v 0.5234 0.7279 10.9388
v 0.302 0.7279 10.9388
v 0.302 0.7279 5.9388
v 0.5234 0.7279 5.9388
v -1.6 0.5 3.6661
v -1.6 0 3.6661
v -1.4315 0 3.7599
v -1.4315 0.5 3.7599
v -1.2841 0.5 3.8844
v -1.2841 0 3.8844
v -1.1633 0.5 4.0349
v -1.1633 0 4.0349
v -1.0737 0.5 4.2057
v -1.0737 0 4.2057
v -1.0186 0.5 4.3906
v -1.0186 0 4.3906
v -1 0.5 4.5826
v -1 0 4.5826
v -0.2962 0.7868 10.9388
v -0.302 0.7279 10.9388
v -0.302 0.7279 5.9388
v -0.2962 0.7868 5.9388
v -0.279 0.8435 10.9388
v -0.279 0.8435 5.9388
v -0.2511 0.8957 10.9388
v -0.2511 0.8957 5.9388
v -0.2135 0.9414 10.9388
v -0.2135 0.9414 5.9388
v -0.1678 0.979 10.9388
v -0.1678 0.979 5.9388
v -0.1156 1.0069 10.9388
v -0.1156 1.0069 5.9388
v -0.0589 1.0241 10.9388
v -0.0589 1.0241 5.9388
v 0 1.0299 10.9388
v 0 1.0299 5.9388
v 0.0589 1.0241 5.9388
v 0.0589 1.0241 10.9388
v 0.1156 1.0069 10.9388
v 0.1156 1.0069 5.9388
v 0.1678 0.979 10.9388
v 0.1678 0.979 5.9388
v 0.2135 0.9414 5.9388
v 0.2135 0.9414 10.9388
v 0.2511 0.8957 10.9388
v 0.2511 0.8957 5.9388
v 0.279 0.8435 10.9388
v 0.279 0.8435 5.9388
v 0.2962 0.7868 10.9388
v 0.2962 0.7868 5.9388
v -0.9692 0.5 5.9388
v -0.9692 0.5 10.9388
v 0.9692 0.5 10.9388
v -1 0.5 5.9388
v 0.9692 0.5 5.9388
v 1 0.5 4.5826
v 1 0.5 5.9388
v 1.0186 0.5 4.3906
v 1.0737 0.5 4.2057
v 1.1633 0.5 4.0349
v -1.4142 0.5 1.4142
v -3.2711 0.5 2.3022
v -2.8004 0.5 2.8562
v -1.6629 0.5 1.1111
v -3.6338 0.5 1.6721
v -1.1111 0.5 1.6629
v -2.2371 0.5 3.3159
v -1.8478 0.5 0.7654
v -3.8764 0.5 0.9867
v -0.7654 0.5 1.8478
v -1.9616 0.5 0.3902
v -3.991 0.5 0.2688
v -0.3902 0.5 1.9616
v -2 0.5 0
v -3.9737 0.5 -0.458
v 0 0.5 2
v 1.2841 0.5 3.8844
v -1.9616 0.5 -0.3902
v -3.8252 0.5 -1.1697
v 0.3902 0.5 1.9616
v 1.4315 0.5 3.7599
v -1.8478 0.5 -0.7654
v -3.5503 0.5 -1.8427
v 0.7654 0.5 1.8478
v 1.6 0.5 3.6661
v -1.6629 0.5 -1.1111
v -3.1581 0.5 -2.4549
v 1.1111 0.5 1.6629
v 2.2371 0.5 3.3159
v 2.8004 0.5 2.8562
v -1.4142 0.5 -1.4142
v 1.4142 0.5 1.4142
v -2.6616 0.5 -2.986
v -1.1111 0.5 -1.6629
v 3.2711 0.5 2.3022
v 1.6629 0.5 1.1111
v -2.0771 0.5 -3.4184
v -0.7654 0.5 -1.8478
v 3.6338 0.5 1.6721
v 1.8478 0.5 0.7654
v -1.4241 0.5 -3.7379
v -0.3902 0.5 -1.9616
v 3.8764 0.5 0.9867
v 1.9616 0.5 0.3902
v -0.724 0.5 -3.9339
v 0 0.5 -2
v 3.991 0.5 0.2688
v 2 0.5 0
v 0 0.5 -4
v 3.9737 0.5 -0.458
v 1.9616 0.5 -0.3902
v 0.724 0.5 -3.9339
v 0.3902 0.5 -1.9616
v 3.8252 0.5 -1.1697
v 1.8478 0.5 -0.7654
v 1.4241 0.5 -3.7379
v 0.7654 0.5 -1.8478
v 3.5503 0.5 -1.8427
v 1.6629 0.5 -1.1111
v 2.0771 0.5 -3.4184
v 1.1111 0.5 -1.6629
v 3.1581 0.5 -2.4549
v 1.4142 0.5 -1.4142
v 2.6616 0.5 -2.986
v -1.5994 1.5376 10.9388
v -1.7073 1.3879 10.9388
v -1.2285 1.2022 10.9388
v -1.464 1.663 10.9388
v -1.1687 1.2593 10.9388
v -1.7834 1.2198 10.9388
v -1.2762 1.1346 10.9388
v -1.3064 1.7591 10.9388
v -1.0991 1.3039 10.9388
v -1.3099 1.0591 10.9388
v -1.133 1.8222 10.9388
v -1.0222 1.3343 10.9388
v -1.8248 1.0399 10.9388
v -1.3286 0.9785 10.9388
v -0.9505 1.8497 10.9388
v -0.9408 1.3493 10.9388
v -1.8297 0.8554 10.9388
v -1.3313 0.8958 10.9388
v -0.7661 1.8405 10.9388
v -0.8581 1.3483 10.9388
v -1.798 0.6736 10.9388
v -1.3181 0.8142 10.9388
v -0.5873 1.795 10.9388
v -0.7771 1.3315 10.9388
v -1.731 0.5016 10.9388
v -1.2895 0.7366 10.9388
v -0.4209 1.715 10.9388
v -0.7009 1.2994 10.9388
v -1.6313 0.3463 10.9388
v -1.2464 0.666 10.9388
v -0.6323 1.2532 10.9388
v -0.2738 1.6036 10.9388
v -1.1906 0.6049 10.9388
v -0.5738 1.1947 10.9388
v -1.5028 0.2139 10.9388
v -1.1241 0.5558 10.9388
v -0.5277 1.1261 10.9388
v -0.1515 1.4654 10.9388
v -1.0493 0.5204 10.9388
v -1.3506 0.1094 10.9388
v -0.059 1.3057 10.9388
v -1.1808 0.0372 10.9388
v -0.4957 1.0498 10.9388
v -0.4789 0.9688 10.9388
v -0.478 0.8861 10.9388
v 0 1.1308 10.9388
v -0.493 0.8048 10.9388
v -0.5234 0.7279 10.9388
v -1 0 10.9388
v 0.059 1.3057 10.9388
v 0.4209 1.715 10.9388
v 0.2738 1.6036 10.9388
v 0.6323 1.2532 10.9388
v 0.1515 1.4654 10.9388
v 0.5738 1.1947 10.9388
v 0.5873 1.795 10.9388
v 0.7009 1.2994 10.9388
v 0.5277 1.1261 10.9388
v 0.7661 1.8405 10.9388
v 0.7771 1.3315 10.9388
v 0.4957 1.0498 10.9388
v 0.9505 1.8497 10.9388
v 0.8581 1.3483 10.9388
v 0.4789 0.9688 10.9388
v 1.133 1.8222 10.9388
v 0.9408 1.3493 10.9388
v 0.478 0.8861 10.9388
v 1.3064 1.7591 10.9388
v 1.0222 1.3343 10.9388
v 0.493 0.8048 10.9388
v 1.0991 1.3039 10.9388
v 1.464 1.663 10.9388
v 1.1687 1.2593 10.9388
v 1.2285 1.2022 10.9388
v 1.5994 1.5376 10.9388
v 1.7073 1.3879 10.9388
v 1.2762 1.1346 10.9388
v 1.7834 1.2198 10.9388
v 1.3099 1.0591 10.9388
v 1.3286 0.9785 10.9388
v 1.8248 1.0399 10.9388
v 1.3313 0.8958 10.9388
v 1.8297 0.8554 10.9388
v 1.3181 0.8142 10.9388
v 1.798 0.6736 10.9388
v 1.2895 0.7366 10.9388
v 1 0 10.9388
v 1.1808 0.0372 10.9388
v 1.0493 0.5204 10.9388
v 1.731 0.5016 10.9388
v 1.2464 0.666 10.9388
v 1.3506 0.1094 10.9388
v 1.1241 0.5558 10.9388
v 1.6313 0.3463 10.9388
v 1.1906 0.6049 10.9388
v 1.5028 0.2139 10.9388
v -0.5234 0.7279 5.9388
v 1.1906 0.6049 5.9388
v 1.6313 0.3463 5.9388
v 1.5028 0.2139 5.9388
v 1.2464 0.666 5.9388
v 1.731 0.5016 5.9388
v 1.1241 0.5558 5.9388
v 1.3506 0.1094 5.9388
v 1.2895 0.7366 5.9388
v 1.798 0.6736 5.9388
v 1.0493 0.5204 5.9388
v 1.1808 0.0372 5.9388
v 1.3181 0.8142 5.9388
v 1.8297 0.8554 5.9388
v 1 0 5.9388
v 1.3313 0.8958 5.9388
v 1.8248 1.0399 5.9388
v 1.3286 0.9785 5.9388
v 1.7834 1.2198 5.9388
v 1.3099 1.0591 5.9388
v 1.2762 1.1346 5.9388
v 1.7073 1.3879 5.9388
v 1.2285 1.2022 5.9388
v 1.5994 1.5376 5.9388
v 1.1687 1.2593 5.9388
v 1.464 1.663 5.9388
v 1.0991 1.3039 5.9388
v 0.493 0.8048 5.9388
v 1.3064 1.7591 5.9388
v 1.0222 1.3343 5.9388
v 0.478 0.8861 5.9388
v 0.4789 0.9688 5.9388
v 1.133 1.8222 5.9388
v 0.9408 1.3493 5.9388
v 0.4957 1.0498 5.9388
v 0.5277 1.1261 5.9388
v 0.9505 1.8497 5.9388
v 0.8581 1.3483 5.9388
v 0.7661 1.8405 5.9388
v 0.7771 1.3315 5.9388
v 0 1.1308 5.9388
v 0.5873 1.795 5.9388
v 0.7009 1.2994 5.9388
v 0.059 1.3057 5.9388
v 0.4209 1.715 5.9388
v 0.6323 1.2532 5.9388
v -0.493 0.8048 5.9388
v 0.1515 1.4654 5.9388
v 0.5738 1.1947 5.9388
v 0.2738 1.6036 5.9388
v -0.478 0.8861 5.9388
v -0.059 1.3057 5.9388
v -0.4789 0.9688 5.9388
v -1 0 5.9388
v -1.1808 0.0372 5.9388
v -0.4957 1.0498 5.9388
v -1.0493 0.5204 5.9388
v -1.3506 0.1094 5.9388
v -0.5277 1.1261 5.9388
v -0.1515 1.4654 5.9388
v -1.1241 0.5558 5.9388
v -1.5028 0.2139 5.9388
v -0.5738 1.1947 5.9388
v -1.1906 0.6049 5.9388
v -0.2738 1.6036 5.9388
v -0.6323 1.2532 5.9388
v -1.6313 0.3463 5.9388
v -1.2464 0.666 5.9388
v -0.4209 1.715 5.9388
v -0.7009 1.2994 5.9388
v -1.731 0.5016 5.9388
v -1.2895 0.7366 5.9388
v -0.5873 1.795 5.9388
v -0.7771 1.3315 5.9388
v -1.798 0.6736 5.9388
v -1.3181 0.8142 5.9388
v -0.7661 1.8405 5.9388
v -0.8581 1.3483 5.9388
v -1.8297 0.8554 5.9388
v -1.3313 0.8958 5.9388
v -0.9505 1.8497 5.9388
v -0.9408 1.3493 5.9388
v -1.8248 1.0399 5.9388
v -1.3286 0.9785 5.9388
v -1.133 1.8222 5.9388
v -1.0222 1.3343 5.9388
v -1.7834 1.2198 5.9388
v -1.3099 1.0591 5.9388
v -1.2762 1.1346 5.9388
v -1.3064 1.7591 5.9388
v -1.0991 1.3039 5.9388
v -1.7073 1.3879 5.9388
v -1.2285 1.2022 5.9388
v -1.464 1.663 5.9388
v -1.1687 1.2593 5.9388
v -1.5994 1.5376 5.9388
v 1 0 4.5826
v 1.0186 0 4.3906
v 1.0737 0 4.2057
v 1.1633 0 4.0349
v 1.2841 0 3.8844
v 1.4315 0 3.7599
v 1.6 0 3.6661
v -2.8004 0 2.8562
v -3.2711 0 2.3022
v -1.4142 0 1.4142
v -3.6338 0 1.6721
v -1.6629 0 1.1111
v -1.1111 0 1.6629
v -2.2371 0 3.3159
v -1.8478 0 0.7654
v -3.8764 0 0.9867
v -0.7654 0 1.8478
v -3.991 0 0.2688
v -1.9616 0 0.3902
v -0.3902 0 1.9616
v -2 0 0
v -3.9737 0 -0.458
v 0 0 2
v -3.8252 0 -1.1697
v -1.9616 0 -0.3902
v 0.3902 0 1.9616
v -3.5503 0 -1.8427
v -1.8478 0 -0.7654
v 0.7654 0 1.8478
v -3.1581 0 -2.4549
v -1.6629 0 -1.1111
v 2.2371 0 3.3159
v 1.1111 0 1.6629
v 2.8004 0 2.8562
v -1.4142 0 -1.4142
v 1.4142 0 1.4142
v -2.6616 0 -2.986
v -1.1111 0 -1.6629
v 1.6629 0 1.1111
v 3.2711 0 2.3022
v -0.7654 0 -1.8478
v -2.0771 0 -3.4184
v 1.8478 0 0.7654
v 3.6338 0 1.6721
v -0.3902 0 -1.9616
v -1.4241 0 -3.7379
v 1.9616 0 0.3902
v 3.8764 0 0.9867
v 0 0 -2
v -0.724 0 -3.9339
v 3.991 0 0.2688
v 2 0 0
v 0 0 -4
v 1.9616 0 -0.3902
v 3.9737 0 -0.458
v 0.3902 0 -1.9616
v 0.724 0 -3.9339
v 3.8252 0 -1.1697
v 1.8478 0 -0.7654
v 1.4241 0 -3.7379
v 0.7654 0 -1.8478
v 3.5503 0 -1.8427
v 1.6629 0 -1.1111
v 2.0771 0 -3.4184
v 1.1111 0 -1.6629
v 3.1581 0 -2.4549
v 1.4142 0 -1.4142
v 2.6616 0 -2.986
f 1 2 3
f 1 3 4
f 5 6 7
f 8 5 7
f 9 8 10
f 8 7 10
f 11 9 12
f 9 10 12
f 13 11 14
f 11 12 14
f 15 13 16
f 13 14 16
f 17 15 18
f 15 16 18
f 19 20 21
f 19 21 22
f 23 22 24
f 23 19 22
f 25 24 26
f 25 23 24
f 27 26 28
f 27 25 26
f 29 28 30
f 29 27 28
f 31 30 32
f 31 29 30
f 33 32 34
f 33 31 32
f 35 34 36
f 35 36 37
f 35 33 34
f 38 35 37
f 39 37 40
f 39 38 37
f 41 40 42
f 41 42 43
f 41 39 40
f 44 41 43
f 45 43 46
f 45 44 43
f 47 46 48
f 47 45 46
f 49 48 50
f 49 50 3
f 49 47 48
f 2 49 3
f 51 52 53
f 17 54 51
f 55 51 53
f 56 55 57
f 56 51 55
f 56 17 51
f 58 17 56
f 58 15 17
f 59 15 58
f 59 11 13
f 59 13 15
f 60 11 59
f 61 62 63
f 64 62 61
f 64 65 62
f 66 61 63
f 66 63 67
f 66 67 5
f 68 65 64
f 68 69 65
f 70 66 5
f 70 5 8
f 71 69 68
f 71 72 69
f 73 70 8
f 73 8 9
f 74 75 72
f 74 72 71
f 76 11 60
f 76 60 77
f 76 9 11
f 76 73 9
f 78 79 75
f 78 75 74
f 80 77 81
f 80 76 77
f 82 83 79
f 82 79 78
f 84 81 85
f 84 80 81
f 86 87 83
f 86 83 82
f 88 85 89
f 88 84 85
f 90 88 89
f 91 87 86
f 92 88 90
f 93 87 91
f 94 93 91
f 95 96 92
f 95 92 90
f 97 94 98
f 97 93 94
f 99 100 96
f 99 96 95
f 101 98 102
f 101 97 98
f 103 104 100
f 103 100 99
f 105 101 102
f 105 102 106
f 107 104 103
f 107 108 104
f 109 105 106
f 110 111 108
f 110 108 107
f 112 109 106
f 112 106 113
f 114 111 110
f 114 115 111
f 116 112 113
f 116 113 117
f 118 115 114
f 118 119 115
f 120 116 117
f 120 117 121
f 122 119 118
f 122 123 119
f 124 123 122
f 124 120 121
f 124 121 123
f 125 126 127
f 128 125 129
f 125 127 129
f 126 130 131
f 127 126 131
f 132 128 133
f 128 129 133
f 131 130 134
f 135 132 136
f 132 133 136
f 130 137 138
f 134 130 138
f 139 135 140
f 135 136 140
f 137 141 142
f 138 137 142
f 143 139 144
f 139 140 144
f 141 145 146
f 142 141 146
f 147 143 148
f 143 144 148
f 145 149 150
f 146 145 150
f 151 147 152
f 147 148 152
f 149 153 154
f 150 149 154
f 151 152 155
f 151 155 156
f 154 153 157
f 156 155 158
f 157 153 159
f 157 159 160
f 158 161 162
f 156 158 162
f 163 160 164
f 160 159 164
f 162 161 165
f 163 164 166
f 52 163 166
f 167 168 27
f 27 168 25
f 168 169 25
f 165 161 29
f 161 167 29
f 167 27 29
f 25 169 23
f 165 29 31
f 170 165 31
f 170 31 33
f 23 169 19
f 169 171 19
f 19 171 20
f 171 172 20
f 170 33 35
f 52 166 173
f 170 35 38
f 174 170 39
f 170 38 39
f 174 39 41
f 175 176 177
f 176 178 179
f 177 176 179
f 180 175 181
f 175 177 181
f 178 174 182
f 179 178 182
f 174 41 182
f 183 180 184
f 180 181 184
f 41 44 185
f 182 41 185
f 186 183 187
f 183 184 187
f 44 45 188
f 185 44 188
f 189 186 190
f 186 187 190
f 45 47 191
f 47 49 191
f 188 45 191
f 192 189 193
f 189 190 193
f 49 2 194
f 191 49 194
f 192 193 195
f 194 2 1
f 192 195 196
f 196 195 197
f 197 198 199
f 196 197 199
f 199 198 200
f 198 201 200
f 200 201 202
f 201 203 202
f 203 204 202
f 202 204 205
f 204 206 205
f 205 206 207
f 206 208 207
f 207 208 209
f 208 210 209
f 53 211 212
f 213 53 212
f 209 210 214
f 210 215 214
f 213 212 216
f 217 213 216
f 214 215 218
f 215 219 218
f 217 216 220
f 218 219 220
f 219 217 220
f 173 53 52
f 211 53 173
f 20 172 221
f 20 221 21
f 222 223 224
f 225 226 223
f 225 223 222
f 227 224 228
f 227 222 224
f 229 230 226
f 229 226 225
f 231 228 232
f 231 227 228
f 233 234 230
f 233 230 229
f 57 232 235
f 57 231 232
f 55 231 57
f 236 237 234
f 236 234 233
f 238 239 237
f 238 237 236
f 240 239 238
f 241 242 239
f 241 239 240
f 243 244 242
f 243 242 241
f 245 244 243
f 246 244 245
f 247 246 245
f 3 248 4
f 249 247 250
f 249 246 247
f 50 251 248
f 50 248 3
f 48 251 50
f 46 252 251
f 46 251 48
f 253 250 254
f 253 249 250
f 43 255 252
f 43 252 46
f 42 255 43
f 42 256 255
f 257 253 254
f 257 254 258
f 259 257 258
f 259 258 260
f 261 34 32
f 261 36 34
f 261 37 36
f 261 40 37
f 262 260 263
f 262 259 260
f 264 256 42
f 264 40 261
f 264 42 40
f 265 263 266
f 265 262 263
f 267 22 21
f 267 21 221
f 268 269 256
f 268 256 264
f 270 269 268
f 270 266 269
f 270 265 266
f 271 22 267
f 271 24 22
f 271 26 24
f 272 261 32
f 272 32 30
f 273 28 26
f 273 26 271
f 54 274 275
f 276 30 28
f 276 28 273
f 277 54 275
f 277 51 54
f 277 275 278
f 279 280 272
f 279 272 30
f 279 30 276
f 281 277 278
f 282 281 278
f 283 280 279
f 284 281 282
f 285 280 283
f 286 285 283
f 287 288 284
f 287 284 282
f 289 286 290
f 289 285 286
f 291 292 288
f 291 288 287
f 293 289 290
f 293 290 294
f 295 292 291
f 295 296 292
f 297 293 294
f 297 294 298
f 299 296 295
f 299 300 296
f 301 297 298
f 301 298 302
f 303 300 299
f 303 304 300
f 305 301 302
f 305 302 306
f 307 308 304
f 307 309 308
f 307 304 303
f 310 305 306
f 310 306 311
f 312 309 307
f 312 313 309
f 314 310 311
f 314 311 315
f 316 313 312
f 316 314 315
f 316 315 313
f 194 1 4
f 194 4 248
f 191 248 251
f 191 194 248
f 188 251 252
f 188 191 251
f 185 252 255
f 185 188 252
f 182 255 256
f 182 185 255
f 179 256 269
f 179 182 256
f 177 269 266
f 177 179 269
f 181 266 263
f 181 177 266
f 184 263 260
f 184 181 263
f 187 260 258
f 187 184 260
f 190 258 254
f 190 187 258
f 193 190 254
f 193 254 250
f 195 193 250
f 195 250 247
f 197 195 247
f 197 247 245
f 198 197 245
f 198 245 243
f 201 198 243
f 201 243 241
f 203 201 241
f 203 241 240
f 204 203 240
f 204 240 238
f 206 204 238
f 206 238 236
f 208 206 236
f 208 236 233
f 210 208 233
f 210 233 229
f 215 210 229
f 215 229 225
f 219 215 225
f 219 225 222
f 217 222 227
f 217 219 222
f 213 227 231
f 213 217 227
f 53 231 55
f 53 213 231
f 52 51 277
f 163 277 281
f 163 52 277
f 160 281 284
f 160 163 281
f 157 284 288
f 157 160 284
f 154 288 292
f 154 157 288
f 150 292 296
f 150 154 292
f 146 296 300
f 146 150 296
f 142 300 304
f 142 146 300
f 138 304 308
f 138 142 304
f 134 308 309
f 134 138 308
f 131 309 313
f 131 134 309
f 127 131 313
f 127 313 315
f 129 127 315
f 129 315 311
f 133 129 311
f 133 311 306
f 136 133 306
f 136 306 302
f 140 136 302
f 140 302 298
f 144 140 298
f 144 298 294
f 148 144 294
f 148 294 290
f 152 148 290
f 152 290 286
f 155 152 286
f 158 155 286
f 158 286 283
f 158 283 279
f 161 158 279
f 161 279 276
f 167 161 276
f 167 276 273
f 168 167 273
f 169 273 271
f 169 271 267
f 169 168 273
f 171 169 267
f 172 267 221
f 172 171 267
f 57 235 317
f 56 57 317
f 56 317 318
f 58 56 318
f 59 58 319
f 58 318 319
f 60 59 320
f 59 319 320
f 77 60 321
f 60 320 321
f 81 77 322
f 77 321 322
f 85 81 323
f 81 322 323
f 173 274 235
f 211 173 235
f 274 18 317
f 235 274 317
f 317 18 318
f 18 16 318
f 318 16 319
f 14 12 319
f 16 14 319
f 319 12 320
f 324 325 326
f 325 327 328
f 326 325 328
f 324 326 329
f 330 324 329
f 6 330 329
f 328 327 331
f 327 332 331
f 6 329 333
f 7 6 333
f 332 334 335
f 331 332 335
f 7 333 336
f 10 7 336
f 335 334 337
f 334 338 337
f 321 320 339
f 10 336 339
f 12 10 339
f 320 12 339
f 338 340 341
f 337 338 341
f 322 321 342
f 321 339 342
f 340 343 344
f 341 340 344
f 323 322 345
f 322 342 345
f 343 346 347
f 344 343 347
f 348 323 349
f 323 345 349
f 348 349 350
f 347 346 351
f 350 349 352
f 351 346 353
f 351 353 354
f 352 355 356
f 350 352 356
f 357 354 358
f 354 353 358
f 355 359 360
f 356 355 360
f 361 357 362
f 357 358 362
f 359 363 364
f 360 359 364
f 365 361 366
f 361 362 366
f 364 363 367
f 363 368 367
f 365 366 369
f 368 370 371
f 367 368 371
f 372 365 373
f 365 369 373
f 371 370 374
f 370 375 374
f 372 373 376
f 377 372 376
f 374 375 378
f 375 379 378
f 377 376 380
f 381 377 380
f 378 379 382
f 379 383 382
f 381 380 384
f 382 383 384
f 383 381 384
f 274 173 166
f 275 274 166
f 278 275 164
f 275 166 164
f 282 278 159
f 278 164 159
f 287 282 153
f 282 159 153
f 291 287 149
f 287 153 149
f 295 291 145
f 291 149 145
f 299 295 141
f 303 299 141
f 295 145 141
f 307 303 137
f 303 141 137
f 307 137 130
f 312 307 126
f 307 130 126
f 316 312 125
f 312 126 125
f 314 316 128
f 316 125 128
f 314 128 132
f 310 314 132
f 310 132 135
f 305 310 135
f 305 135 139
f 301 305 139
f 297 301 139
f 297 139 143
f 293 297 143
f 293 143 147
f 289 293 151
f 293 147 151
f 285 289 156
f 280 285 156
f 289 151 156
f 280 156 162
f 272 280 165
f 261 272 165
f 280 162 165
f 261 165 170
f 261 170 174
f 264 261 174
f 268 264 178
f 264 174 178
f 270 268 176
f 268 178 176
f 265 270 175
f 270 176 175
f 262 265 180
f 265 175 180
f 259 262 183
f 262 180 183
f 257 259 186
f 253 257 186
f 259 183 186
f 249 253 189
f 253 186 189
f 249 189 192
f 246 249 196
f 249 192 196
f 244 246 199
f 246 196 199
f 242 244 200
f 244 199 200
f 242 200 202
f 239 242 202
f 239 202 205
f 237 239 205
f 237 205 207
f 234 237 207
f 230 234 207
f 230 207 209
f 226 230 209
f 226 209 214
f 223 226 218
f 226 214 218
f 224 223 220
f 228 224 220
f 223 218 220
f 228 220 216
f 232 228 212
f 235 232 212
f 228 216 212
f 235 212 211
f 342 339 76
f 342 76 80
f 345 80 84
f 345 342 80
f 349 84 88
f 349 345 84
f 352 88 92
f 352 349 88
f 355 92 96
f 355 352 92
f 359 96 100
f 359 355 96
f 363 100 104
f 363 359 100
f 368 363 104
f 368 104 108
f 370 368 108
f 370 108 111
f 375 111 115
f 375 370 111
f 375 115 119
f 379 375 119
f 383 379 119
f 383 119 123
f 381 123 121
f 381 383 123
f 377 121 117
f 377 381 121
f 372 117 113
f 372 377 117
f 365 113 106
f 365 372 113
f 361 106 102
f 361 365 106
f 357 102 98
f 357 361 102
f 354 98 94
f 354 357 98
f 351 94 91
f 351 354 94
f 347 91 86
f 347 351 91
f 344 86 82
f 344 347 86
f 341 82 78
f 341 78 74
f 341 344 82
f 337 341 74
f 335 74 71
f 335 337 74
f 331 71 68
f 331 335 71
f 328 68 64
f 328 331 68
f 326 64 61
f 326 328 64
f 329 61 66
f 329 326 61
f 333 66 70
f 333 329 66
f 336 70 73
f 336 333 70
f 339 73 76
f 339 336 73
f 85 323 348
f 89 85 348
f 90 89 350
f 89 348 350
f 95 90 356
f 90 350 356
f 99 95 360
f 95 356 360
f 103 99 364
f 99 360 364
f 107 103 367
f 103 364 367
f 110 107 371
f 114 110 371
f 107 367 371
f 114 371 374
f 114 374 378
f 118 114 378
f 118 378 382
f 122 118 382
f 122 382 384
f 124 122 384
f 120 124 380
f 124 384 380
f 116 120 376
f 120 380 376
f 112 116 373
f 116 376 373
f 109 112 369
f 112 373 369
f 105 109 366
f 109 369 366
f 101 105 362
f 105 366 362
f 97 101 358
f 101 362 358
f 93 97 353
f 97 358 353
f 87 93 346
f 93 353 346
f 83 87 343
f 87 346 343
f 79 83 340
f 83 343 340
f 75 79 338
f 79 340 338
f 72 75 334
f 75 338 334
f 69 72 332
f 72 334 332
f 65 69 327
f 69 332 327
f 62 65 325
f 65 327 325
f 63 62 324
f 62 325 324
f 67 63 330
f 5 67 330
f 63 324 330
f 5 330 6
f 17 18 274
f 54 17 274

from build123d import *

# Parameters (mm, degrees)
ESQUISSE1_R      = 2
EXTRUSION1_DEPTH = 0.5
EXTRUSION2_DEPTH = 5


with BuildPart() as part:
    # Esquisse1 → Extrusion1 (new body)
    with BuildSketch(Plane(origin=(0, 0, 0), x_dir=(1, 0, 0), z_dir=(0, 1, 0))):
        with BuildLine():
            Line((-1, -10.93878444), (1, -10.93878444))
            Line((1, -10.93878444), (1, -4.582575695))
            ThreePointArc((1, -4.582575695), (1.163339973, -4.034853137), (1.6, -3.666060556))
            ThreePointArc((1.6, -3.666060556), (0, 4), (-1.6, -3.666060556))
            ThreePointArc((-1.6, -3.666060556), (-1.163339973, -4.034853137), (-1, -4.582575695))
            Line((-1, -4.582575695), (-1, -10.93878444))
        make_face()
        with Locations(Location((0, 0, 0), (0, 0, 270))):  # turned: the seam where the file's is
            Circle(ESQUISSE1_R, mode=Mode.SUBTRACT)
    extrude(amount=EXTRUSION1_DEPTH)

    # Esquisse2 → Extrusion2 (add)
    with BuildSketch(Plane.XY.offset(10.93878444)):
        with BuildLine():
            Line((1, 0), (-1, 0))
            ThreePointArc((-1, 0), (-1.599375594, 1.537610938), (0, 1.130798685))
            ThreePointArc((0, 1.130798685), (1.599375594, 1.537610938), (1, 0))
        make_face()
        with BuildLine():
            Line((-0.52344962, 0.727902261), (-0.302000478, 0.727902261))
            ThreePointArc((-0.302000478, 0.727902261), (0, 1.029902739), (0.302000478, 0.727902261))
            Line((0.302000478, 0.727902261), (0.52344962, 0.727902261))
            ThreePointArc((0.52344962, 0.727902261), (1.108344285, 1.299026833), (0.948429699, 0.497333393))
            Line((0.948429699, 0.497333393), (-0.948429699, 0.497333393))
            ThreePointArc((-0.948429699, 0.497333393), (-1.108344285, 1.299026833), (-0.52344962, 0.727902261))
        make_face(mode=Mode.SUBTRACT)
    extrude(amount=-EXTRUSION2_DEPTH)


solid = part.part
